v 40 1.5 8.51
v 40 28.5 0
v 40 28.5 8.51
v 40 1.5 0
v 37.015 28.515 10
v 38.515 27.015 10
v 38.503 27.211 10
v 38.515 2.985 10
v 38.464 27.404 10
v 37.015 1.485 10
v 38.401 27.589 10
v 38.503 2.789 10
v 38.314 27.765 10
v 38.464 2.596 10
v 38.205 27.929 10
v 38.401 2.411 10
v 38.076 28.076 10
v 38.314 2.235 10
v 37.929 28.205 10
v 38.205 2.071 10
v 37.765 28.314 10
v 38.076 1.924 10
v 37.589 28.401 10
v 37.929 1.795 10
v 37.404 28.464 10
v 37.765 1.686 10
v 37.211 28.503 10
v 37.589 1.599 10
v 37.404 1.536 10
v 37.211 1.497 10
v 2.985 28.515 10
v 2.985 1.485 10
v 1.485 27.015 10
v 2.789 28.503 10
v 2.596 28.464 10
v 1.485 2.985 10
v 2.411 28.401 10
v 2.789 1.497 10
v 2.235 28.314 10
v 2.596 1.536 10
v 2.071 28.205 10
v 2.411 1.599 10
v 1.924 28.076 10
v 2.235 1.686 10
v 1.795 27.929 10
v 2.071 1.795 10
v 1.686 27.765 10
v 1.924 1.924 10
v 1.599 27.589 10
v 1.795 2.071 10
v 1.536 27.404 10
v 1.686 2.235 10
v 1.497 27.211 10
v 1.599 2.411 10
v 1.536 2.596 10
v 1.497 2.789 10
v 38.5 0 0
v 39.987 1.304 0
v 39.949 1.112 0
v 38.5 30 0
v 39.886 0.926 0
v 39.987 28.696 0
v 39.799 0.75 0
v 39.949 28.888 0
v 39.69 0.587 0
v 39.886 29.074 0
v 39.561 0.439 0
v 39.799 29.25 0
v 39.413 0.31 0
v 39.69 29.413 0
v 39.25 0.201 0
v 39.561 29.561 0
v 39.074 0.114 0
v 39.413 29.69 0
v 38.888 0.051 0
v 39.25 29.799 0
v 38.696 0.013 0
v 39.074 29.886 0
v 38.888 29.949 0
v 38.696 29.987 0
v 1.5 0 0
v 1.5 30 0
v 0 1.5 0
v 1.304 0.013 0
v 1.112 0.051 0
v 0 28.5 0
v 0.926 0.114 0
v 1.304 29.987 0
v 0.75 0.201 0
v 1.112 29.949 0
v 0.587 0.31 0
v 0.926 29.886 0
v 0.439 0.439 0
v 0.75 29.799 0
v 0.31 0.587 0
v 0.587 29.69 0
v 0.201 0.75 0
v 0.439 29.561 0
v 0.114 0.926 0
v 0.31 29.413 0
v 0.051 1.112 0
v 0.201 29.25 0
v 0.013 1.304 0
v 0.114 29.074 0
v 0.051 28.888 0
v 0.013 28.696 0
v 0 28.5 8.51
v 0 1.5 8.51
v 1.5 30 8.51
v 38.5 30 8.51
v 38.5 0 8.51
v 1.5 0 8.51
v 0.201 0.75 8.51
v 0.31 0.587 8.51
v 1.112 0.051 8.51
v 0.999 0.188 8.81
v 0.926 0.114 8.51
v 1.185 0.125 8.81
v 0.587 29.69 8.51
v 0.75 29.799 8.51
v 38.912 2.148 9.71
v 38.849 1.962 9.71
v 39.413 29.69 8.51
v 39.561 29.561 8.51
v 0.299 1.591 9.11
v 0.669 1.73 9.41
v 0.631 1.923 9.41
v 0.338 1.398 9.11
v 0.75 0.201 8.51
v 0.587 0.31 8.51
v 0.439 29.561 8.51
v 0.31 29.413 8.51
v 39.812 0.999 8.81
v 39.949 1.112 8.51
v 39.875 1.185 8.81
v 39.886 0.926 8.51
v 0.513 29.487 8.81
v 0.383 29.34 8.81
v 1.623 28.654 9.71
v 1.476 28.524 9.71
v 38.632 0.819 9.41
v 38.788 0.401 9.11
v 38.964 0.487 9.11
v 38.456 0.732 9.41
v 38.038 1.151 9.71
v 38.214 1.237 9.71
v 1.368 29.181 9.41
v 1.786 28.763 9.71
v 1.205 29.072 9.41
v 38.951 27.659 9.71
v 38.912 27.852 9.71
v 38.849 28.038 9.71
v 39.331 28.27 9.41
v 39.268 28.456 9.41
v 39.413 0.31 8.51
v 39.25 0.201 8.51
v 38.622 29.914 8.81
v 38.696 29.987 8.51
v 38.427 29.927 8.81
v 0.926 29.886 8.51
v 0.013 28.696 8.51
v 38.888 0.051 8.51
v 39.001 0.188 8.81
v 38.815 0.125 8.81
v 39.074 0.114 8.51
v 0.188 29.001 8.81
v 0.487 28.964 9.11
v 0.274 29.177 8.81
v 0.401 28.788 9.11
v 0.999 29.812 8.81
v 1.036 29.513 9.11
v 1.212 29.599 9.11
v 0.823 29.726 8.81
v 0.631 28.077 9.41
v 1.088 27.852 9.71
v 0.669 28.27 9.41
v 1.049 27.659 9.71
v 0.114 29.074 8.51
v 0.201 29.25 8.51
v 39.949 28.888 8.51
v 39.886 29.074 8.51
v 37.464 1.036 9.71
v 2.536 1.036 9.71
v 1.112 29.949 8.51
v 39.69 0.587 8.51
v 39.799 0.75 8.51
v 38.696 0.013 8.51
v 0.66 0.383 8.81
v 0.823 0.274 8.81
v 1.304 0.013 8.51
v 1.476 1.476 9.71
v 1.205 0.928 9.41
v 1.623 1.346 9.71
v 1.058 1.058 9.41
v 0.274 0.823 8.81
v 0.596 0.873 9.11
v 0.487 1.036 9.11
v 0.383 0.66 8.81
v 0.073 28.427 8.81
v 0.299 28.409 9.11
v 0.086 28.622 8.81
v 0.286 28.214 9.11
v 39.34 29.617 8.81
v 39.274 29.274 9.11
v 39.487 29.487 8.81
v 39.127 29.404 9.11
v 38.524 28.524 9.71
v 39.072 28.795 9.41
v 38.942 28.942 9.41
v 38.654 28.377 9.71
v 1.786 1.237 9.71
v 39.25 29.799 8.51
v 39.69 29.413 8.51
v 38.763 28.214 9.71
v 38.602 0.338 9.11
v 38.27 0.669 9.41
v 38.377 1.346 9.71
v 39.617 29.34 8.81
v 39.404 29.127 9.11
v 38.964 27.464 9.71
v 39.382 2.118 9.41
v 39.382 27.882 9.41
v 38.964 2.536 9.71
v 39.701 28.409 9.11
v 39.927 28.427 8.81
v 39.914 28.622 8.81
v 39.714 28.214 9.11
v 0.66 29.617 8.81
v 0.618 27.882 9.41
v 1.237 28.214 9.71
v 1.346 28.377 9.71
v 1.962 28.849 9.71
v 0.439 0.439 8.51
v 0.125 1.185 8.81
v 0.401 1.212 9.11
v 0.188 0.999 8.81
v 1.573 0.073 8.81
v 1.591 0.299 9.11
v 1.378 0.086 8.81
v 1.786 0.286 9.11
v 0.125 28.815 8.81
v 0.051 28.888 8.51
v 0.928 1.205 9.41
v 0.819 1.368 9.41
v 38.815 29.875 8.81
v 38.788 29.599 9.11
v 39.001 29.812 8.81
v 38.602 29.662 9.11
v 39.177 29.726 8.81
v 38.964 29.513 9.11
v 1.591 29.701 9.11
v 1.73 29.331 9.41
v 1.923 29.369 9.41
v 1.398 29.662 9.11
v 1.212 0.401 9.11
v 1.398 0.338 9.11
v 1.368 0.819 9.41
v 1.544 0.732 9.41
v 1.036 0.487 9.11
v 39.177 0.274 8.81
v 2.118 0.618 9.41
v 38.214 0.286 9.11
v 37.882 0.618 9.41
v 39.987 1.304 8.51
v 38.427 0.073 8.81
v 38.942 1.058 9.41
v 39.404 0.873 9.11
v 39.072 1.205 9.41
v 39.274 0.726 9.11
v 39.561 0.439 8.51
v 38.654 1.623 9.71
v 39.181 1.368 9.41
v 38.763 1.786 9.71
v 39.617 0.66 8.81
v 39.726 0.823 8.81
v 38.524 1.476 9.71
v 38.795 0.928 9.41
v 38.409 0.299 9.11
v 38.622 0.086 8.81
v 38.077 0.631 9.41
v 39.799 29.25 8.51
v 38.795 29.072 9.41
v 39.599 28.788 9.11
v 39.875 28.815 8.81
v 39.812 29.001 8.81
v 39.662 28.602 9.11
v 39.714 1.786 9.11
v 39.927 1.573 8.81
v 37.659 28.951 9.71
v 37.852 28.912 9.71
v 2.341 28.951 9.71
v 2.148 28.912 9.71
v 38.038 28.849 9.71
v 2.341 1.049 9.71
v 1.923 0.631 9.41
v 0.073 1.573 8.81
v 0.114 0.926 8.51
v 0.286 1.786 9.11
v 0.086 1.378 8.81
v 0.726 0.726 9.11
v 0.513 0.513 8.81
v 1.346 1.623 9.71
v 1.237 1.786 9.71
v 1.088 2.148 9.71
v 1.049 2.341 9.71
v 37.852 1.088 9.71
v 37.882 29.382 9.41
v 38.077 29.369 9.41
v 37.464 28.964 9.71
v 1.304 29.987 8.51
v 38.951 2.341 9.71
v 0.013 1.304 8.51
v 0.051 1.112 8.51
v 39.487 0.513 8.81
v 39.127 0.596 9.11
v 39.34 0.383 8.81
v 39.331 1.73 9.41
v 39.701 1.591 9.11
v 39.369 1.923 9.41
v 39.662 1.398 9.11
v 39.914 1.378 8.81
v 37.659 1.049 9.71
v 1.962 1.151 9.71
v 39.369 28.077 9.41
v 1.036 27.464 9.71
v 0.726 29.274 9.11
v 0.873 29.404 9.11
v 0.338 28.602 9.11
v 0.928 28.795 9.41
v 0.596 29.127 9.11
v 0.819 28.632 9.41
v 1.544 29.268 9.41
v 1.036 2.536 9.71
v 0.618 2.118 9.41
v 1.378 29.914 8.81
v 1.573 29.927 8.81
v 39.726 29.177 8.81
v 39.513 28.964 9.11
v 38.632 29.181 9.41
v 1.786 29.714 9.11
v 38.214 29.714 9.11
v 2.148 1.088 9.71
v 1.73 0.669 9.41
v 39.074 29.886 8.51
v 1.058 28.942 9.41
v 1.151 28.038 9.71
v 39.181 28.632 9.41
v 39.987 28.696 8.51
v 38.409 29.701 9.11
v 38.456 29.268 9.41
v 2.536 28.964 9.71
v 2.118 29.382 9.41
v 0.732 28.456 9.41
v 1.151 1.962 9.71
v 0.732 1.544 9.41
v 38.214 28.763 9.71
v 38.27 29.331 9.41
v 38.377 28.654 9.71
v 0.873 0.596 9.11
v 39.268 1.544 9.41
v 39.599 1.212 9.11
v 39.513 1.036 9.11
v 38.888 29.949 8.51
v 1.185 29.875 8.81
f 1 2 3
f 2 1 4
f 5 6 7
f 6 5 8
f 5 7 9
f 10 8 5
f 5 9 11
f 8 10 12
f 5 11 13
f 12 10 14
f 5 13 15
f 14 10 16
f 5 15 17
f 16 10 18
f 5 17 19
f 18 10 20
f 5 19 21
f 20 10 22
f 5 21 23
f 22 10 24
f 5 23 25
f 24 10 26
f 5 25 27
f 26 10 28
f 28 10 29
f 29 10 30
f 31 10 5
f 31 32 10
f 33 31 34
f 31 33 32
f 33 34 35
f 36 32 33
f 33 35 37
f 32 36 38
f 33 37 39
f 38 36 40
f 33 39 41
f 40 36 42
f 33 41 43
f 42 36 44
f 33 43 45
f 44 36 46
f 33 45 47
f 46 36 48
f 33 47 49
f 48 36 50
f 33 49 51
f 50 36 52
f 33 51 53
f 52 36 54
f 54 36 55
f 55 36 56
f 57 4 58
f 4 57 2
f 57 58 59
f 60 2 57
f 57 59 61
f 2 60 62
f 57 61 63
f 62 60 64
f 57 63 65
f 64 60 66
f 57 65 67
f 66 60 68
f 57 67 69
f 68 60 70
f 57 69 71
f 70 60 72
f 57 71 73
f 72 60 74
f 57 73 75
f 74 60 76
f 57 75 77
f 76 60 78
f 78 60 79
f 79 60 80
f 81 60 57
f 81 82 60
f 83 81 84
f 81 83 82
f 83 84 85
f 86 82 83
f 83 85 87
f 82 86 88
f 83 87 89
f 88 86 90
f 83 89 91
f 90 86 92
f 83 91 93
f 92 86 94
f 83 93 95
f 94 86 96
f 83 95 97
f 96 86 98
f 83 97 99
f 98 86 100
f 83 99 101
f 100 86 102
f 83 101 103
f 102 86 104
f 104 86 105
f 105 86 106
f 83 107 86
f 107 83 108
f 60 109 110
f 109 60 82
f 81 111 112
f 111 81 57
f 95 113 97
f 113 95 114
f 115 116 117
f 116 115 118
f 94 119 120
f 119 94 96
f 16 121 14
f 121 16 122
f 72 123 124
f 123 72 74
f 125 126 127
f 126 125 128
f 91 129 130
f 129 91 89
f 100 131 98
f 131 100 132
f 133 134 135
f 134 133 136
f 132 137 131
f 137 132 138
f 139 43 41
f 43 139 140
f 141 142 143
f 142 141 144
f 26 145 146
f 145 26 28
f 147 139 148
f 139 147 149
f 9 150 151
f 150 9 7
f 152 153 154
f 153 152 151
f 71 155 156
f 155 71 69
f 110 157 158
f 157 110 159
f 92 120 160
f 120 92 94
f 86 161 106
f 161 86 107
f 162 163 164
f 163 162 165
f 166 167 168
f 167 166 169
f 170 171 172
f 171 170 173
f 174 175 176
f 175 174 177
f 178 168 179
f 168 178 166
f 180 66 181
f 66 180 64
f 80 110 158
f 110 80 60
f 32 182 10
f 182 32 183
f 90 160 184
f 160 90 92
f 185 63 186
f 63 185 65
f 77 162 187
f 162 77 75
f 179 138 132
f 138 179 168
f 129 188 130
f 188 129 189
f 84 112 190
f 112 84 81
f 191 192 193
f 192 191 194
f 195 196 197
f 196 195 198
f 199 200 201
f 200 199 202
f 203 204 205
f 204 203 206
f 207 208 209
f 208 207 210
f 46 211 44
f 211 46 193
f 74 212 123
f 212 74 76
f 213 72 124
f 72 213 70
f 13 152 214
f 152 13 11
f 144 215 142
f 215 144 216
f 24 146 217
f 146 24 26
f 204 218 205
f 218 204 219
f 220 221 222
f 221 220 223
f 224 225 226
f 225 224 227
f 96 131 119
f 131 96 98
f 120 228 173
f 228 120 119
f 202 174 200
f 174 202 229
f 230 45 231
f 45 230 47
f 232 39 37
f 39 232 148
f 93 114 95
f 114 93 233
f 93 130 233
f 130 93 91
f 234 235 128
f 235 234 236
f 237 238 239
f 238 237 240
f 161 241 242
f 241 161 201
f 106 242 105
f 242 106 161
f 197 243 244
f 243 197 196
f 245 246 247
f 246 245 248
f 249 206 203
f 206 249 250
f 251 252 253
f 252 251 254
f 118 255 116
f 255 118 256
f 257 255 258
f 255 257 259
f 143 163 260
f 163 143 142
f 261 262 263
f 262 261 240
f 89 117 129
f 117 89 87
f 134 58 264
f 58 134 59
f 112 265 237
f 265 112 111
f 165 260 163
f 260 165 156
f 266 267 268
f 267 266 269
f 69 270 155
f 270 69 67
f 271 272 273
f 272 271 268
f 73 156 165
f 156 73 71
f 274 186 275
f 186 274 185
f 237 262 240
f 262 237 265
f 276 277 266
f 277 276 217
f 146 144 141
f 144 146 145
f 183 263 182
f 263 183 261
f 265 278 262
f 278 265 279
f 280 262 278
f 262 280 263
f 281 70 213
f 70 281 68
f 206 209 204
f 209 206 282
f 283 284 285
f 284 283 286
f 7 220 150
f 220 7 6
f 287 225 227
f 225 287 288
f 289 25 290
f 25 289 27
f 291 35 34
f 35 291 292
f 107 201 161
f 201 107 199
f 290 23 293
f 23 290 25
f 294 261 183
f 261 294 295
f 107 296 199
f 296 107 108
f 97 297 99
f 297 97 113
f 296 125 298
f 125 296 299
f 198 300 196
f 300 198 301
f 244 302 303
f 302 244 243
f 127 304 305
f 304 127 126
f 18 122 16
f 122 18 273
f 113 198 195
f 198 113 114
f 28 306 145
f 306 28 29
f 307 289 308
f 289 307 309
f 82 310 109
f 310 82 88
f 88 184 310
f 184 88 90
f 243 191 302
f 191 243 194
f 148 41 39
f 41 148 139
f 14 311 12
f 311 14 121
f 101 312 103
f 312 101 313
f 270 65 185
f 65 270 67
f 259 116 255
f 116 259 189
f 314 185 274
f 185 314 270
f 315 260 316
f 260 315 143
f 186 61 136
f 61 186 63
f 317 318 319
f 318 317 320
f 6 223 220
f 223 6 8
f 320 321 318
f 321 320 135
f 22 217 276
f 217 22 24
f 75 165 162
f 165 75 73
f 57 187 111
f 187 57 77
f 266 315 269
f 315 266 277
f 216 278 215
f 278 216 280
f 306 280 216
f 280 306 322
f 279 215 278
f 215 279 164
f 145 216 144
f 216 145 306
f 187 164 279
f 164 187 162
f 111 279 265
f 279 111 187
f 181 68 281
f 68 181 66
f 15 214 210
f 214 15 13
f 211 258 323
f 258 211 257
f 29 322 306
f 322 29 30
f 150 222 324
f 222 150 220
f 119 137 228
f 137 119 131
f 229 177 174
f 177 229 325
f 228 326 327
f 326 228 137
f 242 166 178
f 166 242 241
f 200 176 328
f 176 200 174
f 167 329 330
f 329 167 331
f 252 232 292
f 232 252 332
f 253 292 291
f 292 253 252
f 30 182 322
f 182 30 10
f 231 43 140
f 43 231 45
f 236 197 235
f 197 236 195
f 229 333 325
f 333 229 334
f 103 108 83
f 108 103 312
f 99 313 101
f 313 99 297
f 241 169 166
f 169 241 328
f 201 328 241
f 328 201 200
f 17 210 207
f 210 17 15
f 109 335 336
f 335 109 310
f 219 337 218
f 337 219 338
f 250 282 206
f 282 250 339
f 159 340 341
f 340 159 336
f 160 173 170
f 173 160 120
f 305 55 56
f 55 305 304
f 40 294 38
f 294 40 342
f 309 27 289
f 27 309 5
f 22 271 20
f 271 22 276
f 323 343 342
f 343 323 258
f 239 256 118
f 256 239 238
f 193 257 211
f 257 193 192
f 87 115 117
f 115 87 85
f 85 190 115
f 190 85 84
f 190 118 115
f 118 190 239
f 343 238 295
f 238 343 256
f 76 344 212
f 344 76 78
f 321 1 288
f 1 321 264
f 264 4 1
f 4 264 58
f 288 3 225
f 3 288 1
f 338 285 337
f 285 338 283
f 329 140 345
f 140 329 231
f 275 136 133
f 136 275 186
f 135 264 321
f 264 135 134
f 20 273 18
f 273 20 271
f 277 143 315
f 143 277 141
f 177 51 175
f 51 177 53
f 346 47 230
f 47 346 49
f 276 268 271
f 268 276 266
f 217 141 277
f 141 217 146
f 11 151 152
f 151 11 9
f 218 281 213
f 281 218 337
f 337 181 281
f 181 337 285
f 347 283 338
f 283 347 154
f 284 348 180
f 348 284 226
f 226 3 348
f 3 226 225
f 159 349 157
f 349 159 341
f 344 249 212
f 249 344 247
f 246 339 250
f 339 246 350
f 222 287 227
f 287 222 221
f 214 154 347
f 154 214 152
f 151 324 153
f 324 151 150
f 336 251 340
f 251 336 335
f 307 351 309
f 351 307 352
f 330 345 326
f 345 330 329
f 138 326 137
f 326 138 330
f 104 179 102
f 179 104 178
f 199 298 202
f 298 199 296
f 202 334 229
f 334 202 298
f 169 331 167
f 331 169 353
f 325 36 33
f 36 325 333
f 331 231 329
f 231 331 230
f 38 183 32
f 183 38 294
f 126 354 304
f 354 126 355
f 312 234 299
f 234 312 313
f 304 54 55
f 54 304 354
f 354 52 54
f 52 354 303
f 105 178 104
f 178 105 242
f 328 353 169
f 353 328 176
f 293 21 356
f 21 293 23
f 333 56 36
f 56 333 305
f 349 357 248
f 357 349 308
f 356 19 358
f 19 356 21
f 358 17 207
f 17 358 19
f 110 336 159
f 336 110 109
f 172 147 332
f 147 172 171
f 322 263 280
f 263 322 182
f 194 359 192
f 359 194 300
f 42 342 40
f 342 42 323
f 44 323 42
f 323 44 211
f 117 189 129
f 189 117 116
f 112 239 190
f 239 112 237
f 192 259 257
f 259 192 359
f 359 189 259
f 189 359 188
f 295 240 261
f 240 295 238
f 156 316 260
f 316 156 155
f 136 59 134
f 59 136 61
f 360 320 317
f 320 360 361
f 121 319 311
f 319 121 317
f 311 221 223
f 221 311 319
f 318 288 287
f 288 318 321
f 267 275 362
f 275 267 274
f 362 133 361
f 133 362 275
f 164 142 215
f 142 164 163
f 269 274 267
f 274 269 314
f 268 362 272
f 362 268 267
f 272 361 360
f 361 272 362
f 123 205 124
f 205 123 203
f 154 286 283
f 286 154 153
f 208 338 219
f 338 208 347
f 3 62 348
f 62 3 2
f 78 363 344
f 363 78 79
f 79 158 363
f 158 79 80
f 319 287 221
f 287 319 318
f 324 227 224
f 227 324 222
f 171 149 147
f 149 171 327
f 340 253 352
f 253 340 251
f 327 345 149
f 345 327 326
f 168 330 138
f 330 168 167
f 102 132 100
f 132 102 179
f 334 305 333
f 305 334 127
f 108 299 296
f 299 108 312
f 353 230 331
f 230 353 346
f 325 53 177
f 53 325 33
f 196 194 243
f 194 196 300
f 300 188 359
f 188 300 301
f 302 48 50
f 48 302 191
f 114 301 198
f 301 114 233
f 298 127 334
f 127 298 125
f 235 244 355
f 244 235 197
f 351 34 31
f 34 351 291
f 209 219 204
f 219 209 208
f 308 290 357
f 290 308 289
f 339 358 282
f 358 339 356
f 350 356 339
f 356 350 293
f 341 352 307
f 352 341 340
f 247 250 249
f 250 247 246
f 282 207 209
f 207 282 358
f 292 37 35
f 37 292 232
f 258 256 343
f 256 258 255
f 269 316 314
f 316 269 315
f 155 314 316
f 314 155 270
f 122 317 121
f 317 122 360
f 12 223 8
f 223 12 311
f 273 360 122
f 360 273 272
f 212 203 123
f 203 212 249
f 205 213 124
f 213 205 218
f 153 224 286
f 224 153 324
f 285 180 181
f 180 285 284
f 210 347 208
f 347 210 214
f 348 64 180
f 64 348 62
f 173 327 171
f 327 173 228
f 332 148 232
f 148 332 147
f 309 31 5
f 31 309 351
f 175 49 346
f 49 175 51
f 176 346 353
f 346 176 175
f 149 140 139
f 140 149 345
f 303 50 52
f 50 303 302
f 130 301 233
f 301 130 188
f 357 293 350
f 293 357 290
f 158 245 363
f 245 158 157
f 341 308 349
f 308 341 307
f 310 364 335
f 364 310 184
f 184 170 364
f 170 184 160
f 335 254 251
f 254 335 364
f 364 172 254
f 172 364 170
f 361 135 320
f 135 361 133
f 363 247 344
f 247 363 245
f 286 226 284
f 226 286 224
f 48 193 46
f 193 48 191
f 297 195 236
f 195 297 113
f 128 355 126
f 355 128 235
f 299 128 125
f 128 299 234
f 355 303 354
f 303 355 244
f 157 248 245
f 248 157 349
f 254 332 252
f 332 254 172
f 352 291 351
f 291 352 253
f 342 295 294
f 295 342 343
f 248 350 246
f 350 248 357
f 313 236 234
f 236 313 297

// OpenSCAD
// units=mm — generated by scad_emitter.py
// part=unnamed
$fn = 48;

intersection() { cube([40, 30, 10]); hull() { translate([1.5, 1.5, 0]) linear_extrude(height=0.01) offset(r=1.5) square([37, 27]); translate([3, 3, 10]) linear_extrude(height=0.01) offset(r=1.5) square([34, 24]); translate([2.5365, 2.5365, 9.7]) linear_extrude(height=0.01) offset(r=1.5) square([34.9271, 24.9271]); translate([2.1183, 2.1183, 9.4]) linear_extrude(height=0.01) offset(r=1.5) square([35.7634, 25.7634]); translate([1.7865, 1.7865, 9.1]) linear_extrude(height=0.01) offset(r=1.5) square([36.4271, 26.4271]); translate([1.5734, 1.5734, 8.8]) linear_extrude(height=0.01) offset(r=1.5) square([36.8532, 26.8532]); translate([1.5, 1.5, 8.5]) linear_extrude(height=0.01) offset(r=1.5) square([37, 27]); } }
